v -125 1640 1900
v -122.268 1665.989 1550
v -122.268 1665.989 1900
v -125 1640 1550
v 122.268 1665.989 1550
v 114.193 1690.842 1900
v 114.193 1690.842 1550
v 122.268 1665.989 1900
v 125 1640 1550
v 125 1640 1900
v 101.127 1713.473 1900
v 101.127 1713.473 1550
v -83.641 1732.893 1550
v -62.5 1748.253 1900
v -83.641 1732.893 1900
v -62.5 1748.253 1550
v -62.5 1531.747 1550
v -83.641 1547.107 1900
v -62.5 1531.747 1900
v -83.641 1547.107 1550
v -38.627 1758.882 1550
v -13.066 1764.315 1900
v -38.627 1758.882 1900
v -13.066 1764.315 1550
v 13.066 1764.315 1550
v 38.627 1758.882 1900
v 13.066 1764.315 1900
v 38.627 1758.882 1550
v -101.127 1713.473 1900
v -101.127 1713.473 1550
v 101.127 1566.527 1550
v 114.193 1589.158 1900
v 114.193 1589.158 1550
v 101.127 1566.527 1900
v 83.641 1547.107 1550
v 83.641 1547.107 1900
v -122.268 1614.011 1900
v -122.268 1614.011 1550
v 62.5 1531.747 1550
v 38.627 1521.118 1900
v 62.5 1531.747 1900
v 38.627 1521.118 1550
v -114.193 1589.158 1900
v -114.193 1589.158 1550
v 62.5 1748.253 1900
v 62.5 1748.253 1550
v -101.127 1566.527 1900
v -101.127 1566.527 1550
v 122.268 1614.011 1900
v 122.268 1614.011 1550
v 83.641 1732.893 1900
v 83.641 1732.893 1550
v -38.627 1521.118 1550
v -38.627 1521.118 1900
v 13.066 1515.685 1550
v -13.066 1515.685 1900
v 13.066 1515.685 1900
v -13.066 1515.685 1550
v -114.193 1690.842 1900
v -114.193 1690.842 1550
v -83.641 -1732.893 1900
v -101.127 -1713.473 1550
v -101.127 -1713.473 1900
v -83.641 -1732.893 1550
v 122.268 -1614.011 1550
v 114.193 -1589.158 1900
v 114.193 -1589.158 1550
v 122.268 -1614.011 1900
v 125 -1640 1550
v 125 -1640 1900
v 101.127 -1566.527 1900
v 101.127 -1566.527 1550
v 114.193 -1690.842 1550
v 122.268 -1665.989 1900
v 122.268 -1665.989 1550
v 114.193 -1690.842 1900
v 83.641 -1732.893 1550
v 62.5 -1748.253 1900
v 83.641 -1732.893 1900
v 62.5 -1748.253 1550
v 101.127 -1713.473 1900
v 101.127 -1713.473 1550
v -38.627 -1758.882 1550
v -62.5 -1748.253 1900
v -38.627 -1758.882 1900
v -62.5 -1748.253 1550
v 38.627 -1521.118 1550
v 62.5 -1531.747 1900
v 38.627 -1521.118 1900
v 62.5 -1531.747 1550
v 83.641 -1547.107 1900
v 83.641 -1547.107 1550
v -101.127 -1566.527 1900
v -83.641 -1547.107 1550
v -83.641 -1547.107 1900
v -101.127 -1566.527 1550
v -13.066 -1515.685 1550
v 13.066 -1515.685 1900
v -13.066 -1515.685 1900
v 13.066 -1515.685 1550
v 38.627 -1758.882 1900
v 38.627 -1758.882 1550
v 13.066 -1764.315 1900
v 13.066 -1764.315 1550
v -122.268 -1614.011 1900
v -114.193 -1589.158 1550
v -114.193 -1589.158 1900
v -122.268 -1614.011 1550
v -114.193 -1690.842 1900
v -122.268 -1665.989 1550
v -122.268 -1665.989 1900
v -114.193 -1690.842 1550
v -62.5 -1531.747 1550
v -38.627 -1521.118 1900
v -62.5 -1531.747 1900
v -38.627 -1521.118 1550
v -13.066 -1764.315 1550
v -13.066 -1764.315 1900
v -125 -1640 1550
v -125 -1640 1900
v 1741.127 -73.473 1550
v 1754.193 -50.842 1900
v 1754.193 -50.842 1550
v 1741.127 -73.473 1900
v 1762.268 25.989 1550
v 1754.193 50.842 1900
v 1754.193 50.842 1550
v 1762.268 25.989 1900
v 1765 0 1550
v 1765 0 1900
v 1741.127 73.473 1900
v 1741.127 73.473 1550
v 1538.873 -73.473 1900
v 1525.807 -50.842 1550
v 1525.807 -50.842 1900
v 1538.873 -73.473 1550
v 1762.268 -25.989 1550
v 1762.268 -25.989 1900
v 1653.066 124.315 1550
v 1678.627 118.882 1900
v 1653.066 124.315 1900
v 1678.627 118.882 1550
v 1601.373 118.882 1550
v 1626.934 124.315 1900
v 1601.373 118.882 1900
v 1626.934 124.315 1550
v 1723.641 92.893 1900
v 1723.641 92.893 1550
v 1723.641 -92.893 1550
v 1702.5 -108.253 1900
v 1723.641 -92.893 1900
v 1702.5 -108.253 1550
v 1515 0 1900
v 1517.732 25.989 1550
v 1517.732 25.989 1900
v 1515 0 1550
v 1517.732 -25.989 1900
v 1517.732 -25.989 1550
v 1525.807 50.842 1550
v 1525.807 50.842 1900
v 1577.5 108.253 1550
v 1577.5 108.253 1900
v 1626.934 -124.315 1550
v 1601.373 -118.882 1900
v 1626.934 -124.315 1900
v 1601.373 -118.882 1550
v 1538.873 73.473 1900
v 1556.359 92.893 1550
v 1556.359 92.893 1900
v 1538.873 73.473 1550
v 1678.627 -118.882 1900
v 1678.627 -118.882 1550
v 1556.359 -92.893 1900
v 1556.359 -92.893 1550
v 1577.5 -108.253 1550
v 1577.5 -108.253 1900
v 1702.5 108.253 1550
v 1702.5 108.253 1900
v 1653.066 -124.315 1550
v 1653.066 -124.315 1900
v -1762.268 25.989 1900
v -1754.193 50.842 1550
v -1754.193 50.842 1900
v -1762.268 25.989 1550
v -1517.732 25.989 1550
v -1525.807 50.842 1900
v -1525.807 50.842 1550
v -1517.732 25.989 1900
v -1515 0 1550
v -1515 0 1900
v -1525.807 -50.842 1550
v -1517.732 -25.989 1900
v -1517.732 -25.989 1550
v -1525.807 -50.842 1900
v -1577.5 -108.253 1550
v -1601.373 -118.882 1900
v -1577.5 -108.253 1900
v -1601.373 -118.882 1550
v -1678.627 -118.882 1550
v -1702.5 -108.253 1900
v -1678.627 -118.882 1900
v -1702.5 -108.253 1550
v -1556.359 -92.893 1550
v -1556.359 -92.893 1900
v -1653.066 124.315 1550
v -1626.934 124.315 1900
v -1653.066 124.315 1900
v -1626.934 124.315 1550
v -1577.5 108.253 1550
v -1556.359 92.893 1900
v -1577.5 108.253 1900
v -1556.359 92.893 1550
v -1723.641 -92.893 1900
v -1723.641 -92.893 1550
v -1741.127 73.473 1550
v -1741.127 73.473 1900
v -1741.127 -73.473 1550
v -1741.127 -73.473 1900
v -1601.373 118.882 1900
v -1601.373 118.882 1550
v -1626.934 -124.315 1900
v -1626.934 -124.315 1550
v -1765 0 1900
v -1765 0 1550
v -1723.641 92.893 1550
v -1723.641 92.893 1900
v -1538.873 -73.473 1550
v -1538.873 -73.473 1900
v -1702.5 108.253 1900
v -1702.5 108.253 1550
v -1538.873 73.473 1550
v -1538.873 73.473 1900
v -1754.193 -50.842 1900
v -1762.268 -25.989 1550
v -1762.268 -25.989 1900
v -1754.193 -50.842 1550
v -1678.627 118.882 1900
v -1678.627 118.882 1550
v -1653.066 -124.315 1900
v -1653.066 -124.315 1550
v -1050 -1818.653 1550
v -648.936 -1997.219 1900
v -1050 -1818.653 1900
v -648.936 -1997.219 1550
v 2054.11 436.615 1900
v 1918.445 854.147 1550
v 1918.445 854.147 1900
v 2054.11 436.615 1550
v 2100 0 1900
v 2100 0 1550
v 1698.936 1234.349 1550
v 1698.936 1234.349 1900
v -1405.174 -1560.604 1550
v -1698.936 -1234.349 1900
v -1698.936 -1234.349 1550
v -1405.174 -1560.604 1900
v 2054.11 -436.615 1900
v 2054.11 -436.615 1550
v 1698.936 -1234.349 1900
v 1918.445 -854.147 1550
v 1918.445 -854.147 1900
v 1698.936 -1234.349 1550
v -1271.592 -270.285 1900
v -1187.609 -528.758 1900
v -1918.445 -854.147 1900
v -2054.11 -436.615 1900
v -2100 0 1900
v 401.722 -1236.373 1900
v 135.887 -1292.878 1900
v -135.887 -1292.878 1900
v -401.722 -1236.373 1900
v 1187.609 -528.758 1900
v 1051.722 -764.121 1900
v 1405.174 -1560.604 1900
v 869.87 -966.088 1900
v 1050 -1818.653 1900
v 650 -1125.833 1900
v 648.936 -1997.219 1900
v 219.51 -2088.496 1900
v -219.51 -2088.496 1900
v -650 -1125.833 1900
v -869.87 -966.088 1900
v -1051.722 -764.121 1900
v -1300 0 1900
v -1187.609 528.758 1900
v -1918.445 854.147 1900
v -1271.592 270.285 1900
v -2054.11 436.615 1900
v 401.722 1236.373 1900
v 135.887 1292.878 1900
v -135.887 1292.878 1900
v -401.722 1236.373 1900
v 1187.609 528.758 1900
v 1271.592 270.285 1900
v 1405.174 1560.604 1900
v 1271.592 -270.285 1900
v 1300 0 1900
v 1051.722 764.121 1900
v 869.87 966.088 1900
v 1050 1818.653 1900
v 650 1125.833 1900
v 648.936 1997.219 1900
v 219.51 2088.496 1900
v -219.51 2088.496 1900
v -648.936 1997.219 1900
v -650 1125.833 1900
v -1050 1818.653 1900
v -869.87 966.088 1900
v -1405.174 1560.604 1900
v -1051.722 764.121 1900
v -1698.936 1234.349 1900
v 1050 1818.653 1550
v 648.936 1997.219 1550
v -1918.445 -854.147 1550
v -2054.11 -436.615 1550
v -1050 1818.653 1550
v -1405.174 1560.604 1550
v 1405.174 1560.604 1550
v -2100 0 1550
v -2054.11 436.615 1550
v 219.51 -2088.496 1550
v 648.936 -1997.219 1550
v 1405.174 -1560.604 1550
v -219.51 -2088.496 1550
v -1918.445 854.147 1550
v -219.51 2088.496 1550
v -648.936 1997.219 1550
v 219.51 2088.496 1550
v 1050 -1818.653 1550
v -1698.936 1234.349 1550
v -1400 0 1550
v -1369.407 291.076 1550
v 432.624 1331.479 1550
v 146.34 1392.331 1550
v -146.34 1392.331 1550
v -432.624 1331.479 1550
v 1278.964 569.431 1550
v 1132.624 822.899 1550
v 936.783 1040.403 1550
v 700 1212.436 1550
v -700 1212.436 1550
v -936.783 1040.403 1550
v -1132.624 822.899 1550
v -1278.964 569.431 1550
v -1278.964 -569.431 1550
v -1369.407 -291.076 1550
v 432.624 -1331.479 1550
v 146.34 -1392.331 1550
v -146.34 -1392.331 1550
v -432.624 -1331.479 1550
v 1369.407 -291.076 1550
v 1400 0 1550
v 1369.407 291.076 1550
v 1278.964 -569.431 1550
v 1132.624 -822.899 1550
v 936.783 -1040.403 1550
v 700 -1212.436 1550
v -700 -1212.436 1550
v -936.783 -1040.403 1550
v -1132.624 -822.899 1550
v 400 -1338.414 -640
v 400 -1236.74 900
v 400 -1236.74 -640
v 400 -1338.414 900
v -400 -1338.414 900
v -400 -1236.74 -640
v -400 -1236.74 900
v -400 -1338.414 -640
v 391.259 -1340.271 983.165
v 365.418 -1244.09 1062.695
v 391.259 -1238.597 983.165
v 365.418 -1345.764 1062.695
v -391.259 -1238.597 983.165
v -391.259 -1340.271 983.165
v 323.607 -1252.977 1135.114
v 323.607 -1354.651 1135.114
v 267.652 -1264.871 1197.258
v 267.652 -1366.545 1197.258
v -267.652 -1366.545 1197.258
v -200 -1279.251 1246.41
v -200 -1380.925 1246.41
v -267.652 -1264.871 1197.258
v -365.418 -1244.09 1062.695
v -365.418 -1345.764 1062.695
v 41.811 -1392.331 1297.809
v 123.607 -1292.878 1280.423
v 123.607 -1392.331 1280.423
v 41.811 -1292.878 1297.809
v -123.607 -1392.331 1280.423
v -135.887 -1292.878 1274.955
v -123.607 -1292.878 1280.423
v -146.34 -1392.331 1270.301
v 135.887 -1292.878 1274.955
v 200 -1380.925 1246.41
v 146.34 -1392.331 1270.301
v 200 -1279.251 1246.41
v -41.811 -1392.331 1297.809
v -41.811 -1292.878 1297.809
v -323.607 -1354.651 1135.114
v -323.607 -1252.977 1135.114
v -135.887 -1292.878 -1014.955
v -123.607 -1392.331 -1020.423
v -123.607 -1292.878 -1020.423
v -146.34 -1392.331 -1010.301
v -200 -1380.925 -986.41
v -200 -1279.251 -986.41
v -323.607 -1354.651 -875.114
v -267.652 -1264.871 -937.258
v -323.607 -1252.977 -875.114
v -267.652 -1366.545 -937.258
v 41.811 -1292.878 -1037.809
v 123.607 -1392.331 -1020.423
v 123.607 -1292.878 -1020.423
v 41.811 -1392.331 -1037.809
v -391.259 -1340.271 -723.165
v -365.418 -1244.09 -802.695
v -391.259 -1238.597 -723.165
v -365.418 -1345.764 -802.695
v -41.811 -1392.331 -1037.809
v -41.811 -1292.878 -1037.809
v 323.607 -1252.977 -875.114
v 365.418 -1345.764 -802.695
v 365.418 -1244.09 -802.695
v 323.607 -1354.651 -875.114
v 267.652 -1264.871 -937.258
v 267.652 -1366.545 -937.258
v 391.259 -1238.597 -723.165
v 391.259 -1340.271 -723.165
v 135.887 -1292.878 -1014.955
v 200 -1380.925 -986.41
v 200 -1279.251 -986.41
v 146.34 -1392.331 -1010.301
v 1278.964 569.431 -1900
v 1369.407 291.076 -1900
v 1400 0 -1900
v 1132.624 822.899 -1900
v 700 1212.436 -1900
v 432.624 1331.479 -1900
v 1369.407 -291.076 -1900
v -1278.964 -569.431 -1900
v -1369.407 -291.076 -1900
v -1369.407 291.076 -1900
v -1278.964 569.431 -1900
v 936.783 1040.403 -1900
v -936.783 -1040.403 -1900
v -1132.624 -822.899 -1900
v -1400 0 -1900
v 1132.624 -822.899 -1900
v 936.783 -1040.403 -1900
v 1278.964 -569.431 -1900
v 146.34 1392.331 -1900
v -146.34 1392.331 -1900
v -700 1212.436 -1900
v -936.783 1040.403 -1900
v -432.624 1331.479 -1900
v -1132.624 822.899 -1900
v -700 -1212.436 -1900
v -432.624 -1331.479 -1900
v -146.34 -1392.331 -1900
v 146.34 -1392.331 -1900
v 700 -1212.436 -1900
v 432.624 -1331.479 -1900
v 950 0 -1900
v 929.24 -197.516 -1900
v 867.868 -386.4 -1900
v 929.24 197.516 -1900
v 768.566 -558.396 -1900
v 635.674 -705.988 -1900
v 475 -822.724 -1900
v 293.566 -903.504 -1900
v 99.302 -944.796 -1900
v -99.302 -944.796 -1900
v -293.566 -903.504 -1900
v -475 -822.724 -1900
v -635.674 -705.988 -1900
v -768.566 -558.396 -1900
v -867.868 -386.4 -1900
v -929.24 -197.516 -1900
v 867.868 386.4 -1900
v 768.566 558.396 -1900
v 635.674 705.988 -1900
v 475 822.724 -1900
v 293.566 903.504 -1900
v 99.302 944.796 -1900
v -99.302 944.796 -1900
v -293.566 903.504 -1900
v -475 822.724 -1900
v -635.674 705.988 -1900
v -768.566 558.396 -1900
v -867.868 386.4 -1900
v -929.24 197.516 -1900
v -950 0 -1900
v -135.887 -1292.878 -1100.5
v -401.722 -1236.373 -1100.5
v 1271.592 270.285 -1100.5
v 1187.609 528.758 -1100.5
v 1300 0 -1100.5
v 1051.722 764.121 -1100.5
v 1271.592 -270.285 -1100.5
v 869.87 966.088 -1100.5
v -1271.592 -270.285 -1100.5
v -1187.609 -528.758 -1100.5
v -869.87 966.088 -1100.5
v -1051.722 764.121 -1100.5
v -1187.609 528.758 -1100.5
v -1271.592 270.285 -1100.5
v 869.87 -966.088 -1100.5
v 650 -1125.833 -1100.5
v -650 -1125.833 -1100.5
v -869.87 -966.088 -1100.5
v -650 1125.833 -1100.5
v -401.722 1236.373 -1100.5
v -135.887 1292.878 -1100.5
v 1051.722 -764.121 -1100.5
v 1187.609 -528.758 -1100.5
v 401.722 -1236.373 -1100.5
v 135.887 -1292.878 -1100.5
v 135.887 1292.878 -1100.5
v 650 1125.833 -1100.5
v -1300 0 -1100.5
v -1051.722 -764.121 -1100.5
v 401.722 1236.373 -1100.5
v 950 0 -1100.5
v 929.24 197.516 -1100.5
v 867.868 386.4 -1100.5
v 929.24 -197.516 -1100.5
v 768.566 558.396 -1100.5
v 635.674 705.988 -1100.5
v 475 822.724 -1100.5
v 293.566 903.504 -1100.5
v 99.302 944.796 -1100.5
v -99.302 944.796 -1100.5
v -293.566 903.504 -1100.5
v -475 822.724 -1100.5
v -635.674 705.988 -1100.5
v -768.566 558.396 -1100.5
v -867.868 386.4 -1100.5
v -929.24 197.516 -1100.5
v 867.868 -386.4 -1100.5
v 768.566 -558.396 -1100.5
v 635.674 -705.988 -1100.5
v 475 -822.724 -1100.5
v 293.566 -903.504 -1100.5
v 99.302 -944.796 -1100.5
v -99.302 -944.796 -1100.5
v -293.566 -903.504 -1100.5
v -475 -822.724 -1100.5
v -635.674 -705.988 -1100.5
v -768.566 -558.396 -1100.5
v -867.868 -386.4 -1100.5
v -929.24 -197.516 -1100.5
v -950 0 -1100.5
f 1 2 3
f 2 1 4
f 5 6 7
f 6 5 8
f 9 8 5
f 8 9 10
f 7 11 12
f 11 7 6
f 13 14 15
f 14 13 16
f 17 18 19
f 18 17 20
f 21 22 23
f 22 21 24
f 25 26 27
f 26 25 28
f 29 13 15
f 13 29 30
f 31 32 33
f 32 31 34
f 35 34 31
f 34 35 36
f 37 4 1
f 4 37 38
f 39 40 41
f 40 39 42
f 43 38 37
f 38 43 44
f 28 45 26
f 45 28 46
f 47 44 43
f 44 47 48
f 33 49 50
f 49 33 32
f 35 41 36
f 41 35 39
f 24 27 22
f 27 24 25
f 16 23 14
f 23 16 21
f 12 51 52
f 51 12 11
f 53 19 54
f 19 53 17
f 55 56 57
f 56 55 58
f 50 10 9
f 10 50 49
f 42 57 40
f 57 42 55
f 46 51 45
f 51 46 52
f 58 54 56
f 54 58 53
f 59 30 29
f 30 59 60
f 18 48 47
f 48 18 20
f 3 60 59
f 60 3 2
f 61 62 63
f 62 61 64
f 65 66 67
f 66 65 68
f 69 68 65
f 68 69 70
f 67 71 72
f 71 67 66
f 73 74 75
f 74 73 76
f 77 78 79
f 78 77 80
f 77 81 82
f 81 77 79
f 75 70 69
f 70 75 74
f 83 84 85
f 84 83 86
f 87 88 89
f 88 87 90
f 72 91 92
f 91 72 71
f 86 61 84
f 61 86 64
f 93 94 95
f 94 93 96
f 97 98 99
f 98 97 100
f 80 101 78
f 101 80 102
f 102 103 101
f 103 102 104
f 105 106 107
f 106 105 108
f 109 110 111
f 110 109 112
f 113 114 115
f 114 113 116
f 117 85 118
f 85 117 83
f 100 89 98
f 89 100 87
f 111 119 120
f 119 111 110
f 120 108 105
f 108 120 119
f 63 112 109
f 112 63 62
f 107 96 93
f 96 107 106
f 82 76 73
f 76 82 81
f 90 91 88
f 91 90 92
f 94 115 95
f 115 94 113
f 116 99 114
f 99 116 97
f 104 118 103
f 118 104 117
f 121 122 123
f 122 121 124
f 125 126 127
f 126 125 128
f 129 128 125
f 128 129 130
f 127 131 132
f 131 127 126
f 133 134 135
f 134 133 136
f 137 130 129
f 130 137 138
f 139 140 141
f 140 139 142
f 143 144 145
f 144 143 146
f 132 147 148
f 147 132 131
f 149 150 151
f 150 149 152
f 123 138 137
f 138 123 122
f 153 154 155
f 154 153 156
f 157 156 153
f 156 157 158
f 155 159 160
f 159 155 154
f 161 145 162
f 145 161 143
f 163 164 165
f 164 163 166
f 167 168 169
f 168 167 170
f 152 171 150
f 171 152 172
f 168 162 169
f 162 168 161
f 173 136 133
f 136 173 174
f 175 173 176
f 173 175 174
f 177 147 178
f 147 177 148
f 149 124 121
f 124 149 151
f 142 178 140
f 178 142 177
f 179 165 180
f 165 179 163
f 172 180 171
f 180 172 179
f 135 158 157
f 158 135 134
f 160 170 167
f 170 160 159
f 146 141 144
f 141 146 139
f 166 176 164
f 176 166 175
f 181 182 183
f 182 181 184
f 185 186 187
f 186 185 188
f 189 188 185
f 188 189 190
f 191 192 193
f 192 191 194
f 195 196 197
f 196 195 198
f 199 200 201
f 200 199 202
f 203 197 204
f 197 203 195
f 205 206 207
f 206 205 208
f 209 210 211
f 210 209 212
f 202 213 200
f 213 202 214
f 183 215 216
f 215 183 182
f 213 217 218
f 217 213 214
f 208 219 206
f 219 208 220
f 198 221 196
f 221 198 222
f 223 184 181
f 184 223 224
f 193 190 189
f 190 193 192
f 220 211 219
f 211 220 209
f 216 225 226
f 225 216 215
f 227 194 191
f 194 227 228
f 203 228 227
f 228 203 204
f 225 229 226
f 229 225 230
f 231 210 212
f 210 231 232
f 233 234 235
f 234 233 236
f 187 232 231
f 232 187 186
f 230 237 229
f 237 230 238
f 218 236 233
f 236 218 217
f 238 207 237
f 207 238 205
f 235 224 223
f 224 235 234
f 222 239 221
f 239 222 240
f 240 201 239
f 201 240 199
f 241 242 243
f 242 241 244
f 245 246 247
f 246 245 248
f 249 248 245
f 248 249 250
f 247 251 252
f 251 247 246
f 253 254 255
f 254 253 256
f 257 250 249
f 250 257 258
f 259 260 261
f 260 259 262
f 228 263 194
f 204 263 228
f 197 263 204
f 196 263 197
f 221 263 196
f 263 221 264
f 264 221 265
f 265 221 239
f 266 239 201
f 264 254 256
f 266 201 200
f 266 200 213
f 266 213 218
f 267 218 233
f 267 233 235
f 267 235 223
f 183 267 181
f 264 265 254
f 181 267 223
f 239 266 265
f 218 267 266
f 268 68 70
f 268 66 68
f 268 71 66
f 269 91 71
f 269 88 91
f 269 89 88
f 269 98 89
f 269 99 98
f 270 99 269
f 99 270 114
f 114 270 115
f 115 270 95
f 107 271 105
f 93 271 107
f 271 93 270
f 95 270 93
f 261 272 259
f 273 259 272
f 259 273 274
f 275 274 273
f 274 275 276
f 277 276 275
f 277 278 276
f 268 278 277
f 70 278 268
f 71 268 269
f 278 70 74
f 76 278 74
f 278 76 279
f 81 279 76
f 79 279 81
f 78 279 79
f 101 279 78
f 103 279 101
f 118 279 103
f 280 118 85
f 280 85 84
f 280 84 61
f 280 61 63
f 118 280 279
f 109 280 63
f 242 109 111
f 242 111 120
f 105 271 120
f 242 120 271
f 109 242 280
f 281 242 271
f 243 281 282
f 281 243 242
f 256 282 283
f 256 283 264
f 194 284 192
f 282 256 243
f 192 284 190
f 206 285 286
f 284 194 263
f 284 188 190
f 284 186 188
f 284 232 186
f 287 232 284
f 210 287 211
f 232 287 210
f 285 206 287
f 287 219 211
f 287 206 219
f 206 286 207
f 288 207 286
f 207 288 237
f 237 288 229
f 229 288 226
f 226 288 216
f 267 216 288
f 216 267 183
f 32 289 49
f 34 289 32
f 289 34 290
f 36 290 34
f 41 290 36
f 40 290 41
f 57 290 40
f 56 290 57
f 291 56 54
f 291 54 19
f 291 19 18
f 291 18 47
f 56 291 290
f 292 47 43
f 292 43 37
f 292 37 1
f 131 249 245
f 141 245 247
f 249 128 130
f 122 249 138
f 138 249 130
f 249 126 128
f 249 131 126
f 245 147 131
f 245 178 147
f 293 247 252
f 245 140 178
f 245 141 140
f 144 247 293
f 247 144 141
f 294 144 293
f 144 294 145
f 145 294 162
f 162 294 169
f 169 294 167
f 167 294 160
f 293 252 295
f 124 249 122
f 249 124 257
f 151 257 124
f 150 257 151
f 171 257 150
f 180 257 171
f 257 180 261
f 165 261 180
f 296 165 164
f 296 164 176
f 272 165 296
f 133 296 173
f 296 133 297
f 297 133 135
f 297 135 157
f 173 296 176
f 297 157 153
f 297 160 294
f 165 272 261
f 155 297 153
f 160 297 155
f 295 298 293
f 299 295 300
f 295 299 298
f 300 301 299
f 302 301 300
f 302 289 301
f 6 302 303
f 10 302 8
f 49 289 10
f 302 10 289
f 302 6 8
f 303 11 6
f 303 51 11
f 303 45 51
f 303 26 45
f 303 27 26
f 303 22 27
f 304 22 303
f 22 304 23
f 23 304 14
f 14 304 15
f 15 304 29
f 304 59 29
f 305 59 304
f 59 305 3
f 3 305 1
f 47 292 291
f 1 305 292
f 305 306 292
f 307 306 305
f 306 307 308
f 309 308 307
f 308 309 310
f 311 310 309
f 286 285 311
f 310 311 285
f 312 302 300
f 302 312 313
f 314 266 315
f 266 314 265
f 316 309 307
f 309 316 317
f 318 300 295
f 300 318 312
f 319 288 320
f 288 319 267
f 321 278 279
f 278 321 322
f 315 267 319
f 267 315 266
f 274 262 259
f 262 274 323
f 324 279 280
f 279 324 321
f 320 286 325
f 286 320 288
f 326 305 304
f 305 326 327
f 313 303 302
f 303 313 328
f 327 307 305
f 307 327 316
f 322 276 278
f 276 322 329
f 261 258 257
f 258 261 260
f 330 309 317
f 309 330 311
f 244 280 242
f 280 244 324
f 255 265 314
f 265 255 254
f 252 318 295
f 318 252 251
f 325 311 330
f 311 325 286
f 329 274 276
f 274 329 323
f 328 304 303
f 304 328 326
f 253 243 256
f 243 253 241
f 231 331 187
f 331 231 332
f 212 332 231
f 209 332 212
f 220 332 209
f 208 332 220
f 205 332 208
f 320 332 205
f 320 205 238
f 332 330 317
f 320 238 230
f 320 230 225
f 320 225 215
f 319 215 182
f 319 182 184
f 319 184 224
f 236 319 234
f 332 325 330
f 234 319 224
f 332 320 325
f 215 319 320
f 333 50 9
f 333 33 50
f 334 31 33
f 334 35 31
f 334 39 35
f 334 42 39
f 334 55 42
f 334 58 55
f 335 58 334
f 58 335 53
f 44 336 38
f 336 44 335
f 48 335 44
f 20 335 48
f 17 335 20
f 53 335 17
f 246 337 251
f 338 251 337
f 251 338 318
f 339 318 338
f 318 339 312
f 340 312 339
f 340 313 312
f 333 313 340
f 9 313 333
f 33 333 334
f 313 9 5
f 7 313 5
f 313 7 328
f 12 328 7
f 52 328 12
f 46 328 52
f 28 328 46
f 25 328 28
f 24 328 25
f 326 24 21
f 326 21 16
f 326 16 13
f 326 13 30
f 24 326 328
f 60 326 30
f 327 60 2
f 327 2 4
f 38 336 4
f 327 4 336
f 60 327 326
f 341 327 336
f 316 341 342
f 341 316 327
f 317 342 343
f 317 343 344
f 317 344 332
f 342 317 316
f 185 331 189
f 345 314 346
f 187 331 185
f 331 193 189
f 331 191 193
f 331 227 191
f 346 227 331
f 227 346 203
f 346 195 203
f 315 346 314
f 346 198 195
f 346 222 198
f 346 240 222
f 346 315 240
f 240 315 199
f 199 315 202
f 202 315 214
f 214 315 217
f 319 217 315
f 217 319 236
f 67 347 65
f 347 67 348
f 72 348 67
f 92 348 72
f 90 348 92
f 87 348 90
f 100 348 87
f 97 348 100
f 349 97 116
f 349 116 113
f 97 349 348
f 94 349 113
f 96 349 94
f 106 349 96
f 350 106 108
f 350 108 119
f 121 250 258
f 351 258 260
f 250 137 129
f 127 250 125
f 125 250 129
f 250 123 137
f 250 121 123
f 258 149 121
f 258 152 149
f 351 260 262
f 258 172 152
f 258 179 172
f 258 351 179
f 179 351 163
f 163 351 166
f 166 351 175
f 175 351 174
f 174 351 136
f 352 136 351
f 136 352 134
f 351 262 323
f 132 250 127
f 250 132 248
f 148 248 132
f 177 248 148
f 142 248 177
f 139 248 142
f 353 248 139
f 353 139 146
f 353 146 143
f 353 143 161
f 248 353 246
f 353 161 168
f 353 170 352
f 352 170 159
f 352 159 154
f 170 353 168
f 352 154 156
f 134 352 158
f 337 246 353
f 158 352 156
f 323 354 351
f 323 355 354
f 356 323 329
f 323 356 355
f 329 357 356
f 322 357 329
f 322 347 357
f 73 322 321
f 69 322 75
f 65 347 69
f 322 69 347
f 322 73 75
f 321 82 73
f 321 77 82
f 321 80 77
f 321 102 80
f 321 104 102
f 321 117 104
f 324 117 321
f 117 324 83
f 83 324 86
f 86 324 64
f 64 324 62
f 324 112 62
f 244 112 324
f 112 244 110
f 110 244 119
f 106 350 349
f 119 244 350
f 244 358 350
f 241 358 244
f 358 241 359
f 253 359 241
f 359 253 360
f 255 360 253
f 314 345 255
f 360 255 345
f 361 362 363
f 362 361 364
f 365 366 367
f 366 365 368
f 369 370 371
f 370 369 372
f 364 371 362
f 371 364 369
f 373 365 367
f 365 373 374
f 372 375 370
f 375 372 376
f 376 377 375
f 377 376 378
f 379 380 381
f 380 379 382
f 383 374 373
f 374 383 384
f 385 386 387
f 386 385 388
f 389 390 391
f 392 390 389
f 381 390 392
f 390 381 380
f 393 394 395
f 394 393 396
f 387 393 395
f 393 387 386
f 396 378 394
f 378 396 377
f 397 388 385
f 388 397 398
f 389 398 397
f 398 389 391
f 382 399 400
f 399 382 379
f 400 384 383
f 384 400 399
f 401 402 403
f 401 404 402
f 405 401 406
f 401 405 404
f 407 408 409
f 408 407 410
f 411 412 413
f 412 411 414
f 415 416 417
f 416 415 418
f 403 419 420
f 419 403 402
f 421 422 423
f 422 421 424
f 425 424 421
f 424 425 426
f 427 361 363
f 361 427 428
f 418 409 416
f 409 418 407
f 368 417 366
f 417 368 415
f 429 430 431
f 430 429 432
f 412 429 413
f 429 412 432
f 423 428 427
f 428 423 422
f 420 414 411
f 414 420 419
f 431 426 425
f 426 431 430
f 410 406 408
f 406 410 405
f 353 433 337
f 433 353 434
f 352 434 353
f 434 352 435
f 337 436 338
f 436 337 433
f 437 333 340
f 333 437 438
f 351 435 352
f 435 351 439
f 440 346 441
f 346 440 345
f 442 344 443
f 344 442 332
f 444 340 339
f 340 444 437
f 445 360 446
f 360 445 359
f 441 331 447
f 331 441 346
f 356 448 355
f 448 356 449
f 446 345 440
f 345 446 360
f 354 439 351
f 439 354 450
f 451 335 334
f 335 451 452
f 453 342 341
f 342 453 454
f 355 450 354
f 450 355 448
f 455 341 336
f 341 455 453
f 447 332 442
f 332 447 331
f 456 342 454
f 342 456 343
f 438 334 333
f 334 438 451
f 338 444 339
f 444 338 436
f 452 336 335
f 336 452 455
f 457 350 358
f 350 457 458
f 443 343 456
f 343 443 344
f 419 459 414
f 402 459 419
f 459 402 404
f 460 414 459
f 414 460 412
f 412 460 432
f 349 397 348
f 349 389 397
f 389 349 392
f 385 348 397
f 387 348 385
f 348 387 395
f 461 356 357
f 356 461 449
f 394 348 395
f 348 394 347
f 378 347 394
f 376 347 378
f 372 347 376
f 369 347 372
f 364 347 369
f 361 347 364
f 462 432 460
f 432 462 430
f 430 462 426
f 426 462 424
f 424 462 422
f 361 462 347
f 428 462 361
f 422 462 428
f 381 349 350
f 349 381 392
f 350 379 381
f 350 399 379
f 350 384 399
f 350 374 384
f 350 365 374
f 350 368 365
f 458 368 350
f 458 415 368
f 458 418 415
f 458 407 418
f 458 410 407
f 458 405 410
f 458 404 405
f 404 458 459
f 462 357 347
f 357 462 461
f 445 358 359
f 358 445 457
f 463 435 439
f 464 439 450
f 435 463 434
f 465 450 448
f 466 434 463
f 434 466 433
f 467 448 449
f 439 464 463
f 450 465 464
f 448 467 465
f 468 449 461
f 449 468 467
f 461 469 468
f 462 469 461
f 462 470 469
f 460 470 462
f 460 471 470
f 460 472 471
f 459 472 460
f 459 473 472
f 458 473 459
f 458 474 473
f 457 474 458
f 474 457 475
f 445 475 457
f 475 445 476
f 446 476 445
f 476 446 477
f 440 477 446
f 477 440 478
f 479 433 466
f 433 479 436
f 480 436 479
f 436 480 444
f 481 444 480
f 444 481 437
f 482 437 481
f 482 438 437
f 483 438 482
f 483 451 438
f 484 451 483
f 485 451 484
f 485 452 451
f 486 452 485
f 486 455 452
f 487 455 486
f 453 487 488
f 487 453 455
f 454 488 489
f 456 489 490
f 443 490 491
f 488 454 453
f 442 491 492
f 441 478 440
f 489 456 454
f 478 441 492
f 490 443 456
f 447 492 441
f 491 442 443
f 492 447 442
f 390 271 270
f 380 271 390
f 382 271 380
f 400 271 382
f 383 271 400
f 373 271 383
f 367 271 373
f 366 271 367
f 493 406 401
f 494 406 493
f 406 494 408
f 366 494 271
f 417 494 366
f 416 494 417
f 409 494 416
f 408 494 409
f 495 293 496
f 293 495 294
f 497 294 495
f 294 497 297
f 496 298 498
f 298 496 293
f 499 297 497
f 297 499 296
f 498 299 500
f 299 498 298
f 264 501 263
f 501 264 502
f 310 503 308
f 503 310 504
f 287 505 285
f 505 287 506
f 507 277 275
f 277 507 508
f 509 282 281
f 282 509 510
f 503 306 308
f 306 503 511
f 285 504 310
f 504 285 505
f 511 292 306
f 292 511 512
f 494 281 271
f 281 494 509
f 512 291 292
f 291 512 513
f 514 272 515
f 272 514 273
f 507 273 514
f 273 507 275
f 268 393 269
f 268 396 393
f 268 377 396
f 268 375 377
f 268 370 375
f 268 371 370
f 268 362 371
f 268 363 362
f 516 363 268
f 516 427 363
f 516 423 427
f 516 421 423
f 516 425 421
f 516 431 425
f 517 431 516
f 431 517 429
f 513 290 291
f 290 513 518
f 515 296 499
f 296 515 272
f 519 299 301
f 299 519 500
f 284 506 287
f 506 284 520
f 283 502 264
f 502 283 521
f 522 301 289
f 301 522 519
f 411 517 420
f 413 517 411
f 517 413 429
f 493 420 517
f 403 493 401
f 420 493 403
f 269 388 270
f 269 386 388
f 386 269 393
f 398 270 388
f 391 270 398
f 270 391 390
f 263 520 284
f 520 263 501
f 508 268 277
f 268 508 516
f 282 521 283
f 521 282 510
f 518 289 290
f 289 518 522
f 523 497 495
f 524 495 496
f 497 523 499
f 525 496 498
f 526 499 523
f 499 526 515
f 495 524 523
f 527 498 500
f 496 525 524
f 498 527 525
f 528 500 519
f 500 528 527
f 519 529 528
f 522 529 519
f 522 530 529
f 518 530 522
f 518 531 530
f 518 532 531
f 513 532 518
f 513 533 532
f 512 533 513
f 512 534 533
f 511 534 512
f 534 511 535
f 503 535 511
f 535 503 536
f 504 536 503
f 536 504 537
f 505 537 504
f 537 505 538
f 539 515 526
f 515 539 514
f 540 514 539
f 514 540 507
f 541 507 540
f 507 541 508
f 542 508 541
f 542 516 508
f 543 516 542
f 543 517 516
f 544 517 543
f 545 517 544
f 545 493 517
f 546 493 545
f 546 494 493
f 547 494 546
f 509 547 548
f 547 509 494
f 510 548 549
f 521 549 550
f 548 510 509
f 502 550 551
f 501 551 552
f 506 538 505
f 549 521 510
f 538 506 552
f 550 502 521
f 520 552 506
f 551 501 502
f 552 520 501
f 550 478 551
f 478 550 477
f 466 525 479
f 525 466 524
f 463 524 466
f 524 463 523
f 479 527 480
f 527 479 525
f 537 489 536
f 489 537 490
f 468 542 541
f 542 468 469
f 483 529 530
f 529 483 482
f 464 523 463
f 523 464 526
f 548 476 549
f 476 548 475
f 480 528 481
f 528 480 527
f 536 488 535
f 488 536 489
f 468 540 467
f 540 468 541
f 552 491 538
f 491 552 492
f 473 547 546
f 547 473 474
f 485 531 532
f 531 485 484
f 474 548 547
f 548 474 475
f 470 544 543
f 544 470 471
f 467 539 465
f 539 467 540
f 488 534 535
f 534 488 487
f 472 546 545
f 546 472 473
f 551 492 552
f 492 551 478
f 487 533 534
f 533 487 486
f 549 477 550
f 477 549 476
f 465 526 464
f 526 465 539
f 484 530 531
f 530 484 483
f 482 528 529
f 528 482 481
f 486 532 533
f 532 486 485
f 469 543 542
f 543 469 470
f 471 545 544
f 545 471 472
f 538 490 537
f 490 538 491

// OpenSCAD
// file: ../common/holes.scad
module countersunk_hole(h, d, r_inner, r_outer, center=true) {
  centroid = center ? [0, 0, 0] : [r_outer, r_outer, h / 2];
  translate(centroid) {
    translate([0, 0, (h - d) / 2]) cylinder(r=r_outer, h=d + 1, center=true);
    cylinder(r=r_inner, h=h + 1, center=true);
  }
}

module circle_mount(r_mount, r_hole, h) {
  translate([0, r_mount, 0]) cylinder(r=r_hole, h=h + 1, center=true);
  translate([0, -r_mount, 0]) cylinder(r=r_hole, h=h + 1, center=true);
  translate([r_mount, 0, 0]) cylinder(r=r_hole, h=h + 1, center=true);
  translate([-r_mount, 0, 0]) cylinder(r=r_hole, h=h + 1, center=true);
}

module square_mount(r_mount, r_hole, h) {
  translate([r_mount, r_mount, 0]) cylinder(r=r_hole, h=h + 1, center=true);
  translate([r_mount, -r_mount, 0]) cylinder(r=r_hole, h=h + 1, center=true);
  translate([-r_mount, r_mount, 0]) cylinder(r=r_hole, h=h + 1, center=true);
  translate([-r_mount, -r_mount, 0]) cylinder(r=r_hole, h=h + 1, center=true);
}

module mirror_drilling(axis=[1, 0, 0]) {
  children();
  mirror(axis) children();
}

module quad_drilling(axis=[0, 0, 1]) {
  children();
  mirror([1, 0, 0]) children();
  mirror(axis) {
    children();
    mirror([1, 0, 0]) children();
  }
}
// main file
use <../common/holes.scad>;

module StepperProtectorCutout(cutoutDepth, cutoutHeight) {
  cutoutWidth = 800;

  cube([cutoutWidth, cutoutDepth, cutoutHeight - cutoutWidth], center=true);
  translate([0, 0, (cutoutHeight - cutoutWidth) / 2]) rotate([90, 0, 0]) cylinder(r=cutoutWidth / 2, h=cutoutDepth, center=true);
  translate([0, 0, -(cutoutHeight - cutoutWidth) / 2]) rotate([90, 0, 0]) cylinder(r=cutoutWidth / 2, h=cutoutDepth, center=true);
}

module StepperProtector(r, h, bearingRadius=950, bearingDepth=800) {
  cutoutDepth = 400;
  cutoutHeight = 2340;
  topHeight = 350;

  difference() {
    union() {
      translate([0, 0, (h - topHeight) / 2]) difference() {
        cylinder(r=r + 700, h=topHeight, center=true);
        circle_mount(r_mount=r + 240, r_hole=125, h=topHeight);
      }
      difference() {
        cylinder(r=r, h=h, center=true);
        translate([0, -(r - cutoutDepth / 2), (h - cutoutHeight) / 2 - topHeight - 250]) {
          StepperProtectorCutout(cutoutDepth, cutoutHeight);
        }
      }
    }
    translate([0, 0, bearingDepth / 2]) cylinder(r=r - 100, h=h - bearingDepth + 1, center=true);
    cylinder(r=bearingRadius, h=h + 1, center=true);
  }
}

StepperProtector(1400, 3800);
